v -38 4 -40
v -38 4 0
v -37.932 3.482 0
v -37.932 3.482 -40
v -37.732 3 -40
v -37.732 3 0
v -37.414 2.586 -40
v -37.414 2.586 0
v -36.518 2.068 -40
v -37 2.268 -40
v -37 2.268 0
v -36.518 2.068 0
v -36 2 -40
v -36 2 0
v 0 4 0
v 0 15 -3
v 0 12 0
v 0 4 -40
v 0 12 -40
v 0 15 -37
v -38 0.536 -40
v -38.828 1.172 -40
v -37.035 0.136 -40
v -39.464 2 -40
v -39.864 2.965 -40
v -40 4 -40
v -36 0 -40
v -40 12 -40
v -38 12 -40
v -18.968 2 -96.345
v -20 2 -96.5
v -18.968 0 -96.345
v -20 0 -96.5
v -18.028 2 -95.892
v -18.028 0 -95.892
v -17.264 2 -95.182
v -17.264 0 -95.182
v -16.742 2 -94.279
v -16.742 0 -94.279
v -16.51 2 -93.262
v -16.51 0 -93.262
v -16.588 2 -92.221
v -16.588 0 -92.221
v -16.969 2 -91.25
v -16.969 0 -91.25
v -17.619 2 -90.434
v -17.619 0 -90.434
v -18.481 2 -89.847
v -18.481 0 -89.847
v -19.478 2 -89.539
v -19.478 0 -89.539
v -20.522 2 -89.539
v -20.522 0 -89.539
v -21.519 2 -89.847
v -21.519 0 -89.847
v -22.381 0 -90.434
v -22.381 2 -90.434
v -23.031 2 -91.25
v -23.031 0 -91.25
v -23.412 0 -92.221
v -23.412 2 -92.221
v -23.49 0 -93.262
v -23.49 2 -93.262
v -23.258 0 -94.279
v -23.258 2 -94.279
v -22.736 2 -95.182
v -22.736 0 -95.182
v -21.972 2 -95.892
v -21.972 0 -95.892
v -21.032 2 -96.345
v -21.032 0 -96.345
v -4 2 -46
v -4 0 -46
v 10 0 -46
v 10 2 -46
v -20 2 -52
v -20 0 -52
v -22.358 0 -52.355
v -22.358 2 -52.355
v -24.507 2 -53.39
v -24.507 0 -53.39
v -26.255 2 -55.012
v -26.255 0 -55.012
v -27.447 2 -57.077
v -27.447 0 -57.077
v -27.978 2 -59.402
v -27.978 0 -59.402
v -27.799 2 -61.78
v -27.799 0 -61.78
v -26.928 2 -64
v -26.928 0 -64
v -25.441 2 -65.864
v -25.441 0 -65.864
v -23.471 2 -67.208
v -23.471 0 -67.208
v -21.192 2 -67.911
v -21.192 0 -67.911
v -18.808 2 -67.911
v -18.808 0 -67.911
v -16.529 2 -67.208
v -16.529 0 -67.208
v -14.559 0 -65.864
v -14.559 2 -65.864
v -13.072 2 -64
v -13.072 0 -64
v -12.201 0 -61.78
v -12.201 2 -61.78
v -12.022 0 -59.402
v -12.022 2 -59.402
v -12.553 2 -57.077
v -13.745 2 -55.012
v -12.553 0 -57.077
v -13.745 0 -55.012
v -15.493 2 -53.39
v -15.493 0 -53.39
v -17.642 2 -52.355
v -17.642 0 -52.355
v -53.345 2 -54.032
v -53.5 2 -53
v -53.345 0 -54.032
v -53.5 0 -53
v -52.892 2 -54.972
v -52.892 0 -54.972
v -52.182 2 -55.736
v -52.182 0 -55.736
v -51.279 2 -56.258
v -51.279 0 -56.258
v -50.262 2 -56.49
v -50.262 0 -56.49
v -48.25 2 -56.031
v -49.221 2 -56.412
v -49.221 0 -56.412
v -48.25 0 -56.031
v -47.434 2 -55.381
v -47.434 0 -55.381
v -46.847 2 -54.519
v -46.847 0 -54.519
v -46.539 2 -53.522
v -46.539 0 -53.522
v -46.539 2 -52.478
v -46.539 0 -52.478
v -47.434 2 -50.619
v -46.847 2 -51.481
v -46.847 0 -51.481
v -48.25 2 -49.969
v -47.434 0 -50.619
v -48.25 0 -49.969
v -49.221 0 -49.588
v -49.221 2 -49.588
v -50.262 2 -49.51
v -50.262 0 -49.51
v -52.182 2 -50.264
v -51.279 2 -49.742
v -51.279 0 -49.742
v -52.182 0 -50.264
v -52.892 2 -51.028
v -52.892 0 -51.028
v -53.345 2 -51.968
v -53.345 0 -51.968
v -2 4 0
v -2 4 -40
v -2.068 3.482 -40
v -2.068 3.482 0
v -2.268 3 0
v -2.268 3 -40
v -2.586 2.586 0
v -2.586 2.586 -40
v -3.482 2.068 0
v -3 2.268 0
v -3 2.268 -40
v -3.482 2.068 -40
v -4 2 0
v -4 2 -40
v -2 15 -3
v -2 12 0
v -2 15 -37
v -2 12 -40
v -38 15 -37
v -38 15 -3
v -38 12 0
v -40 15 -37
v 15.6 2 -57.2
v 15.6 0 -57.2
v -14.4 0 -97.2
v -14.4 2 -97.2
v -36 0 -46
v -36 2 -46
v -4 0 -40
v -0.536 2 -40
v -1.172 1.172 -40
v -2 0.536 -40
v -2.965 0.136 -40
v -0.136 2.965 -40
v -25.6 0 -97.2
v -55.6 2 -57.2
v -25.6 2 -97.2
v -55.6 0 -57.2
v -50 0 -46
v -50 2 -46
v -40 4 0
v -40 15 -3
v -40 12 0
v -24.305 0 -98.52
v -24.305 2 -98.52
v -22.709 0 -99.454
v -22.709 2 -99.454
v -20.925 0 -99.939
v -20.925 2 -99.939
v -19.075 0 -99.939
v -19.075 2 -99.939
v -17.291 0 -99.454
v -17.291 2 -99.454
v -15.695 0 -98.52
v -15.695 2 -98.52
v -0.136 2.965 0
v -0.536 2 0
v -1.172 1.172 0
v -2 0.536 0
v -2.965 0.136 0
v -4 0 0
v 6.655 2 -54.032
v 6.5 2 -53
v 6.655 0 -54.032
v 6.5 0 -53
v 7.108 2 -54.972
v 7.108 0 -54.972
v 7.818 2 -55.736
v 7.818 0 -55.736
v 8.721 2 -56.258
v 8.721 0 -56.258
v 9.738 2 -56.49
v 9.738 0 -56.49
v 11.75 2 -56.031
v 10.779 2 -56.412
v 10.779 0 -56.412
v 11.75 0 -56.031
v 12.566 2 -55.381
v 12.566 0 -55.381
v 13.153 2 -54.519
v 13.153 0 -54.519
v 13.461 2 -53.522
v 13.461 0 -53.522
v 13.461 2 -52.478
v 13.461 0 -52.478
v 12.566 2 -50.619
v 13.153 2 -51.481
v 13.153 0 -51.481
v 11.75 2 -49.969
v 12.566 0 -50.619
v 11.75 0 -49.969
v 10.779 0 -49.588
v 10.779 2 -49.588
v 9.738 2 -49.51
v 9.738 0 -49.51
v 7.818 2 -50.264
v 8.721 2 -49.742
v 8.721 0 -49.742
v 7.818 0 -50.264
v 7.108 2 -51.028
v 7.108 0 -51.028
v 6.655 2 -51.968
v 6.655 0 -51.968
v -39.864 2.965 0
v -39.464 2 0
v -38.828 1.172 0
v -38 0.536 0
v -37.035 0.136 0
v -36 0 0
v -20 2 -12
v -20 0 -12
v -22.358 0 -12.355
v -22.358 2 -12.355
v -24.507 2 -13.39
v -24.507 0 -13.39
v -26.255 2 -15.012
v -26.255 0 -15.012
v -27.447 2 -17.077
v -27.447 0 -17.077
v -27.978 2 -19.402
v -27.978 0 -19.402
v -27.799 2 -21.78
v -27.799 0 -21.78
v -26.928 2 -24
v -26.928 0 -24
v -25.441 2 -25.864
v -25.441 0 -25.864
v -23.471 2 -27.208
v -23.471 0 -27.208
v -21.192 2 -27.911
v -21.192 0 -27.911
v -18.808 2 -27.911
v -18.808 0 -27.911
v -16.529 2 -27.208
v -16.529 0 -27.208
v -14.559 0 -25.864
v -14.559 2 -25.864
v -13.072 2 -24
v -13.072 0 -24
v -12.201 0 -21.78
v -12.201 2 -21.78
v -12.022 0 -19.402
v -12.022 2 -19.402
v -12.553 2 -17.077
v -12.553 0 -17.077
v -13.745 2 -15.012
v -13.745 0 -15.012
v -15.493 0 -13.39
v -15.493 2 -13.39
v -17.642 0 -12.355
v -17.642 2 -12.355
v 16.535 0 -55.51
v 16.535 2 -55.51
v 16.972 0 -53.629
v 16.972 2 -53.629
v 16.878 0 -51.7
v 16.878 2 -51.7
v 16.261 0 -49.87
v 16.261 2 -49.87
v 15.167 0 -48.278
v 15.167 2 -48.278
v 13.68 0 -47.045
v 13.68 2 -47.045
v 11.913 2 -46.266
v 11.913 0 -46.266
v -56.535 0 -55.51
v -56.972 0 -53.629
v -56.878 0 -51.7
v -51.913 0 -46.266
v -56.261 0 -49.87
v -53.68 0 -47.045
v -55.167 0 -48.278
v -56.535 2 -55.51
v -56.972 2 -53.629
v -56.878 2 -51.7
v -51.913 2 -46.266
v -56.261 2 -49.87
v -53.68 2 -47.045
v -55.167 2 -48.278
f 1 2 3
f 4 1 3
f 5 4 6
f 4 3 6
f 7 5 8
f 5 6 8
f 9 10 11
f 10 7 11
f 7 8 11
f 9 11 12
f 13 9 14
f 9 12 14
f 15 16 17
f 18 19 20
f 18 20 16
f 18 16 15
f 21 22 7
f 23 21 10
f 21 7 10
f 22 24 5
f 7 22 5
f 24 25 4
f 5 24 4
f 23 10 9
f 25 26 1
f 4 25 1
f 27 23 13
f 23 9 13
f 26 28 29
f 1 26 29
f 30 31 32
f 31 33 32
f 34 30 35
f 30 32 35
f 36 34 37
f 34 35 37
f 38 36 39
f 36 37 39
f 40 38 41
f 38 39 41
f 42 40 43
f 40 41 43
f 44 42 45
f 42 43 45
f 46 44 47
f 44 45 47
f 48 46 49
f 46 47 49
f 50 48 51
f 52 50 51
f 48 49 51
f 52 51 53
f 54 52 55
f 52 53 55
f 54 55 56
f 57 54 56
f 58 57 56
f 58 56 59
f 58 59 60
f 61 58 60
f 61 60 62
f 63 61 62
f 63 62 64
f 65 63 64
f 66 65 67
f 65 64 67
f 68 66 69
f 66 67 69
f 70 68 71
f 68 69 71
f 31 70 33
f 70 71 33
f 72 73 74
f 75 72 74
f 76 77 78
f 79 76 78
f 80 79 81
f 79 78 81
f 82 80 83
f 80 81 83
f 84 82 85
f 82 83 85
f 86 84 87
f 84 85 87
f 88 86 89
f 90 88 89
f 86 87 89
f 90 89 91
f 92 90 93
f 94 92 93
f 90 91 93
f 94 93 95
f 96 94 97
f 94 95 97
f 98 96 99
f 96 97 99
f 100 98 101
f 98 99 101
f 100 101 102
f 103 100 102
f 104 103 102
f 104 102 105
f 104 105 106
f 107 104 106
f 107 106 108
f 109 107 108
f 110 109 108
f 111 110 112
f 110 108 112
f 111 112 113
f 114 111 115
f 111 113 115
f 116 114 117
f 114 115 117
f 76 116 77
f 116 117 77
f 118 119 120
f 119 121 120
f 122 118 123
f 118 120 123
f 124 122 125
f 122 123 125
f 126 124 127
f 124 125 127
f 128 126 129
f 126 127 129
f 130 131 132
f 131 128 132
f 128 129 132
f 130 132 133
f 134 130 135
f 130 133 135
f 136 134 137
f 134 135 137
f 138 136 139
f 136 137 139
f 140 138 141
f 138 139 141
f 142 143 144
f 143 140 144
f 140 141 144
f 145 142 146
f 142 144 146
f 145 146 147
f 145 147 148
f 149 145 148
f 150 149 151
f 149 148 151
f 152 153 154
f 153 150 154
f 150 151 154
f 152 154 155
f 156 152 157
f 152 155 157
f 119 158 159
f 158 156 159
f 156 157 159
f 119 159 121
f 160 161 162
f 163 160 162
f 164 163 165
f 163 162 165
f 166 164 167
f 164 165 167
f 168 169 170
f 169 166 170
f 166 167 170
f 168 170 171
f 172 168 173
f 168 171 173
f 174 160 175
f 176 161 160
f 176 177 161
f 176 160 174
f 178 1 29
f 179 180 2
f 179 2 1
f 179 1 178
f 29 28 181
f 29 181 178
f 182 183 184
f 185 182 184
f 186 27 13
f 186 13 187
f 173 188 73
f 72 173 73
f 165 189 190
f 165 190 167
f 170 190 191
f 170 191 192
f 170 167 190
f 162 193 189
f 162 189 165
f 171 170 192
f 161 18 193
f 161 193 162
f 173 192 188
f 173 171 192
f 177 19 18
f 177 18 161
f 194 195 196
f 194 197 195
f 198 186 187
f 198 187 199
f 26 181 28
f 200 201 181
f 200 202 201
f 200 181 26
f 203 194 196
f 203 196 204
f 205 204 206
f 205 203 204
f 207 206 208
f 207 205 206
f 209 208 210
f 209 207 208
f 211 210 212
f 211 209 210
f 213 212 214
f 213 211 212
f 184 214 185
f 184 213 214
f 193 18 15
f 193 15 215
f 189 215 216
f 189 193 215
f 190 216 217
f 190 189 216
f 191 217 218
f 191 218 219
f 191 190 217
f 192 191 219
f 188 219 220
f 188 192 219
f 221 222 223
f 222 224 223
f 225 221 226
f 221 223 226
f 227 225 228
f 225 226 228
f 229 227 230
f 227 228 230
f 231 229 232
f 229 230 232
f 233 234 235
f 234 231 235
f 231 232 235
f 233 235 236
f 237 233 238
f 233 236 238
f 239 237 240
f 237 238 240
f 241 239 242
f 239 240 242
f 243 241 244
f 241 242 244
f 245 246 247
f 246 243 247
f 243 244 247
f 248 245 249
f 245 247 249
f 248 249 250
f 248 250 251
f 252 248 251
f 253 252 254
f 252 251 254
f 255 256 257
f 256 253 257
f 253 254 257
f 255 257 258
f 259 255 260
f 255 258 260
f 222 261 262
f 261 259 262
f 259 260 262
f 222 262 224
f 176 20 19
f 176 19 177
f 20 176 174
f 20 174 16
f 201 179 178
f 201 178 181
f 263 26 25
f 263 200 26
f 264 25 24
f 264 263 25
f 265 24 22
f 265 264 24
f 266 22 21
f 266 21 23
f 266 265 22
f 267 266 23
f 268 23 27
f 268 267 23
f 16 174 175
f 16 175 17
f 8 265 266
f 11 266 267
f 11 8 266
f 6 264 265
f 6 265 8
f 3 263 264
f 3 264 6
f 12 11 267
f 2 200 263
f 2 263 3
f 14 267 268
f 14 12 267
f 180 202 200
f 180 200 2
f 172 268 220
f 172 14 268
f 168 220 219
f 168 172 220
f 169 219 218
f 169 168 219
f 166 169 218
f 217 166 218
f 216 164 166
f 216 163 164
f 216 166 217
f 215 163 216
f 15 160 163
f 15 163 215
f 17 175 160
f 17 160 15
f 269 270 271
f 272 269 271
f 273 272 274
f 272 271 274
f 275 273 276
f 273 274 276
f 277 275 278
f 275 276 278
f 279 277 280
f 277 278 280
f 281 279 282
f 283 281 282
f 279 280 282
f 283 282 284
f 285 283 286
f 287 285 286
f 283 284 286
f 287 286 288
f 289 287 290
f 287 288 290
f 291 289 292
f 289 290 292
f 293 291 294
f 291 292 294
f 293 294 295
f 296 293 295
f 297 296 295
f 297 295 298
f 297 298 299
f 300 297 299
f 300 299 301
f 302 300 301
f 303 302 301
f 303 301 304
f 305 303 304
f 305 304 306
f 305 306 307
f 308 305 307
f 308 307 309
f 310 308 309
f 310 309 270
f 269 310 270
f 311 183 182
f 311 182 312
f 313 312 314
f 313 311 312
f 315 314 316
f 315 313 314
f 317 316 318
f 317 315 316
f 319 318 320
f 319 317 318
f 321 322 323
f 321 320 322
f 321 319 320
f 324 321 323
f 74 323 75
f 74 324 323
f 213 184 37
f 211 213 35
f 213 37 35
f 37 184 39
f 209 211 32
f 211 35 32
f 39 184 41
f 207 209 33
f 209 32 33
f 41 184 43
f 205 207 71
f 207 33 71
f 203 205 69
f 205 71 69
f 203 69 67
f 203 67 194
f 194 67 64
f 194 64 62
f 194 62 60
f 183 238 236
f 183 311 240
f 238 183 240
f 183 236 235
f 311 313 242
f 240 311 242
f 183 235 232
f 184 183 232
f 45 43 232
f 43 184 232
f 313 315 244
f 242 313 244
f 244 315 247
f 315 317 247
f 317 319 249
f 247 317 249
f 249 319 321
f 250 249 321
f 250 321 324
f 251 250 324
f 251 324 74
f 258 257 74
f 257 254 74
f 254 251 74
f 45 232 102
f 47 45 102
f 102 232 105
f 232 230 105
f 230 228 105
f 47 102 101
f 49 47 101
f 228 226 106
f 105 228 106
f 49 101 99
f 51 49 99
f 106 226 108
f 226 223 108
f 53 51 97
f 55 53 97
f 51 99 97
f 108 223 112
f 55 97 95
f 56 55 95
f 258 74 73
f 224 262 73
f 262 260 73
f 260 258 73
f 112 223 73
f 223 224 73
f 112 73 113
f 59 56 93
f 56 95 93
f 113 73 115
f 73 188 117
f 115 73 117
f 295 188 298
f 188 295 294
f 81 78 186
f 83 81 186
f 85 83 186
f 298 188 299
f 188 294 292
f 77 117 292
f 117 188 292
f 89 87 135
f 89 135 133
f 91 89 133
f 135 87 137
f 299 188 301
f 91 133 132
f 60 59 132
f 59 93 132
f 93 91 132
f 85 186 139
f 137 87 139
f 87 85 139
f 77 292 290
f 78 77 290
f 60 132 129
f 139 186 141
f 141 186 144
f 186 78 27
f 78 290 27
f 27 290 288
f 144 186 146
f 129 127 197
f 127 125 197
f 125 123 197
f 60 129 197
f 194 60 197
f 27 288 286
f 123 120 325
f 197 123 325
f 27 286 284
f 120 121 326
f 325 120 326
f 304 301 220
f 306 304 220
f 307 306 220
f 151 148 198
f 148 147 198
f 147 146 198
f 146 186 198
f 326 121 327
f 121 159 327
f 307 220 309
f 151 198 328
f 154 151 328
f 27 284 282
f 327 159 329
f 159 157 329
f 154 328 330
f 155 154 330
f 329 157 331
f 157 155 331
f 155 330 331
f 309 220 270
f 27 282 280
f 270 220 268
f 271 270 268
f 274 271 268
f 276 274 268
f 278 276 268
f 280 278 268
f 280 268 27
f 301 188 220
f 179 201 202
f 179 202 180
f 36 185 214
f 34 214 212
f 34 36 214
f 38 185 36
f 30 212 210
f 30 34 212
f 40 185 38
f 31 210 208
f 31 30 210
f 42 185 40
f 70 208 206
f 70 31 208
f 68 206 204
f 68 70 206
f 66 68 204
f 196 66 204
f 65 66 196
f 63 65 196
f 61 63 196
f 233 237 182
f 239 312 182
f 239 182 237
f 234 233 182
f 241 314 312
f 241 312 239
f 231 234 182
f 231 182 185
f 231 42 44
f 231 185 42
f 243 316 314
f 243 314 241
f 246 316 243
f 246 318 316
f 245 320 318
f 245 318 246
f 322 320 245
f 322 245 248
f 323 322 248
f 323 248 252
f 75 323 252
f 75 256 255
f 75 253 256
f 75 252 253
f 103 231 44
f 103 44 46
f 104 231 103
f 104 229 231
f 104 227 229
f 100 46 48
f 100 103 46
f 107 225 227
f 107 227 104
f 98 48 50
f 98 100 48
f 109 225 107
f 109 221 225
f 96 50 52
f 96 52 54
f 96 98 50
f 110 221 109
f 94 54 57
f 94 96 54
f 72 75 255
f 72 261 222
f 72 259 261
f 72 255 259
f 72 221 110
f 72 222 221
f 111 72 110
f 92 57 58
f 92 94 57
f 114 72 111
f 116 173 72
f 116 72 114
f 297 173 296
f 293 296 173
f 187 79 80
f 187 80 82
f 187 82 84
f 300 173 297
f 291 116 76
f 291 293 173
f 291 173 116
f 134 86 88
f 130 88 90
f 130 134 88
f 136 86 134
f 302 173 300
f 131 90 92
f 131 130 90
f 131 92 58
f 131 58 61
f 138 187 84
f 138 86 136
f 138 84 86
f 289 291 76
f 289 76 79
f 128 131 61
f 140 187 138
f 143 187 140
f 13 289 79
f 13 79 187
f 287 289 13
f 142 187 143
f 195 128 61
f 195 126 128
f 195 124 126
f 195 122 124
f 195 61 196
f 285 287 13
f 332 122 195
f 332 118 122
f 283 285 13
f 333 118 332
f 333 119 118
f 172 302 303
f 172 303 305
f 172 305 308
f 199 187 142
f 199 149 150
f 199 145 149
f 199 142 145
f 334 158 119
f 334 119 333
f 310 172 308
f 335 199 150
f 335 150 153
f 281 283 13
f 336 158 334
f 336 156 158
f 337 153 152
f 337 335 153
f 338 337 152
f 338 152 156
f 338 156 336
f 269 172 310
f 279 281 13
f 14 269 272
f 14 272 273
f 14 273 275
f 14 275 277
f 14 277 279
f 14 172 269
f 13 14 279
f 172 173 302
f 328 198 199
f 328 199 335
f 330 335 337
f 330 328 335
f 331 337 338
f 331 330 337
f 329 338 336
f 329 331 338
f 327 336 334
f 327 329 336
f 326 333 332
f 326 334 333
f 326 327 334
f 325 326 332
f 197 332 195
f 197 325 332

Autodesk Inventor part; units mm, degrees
ref_plane "YZ Plane" through (0, 0, 0) normal (1, 0, 0) x (0, 1, 0)
ref_plane "XZ Plane" through (0, 0, 0) normal (0, 1, 0) x (-1, 0, 0)
ref_plane "XY Plane" through (0, 0, 0) normal (0, 0, 1) x (1, 0, 0)
sketch "Náčrt1" plane through (0, 0, 0) normal (0, 1, 0) x (-1, 0, 0)
  line L0 (20, 0) -> (40, 0)
  line L1 (40, 0) -> (40, -40)
  line L2 (40, -40) -> (36, -40)
  line L3 (36, -40) -> (36, -46)
  circle A0 centre (50, -53) radius 3.5
  arc A1 (55.6, -57.2) -> (50, -46) centre (50, -53) ccw
  line L4 (36, -46) -> (50, -46)
  arc A2 (20, -96.5) -> (20, -89.5) centre (20, -93) ccw
  arc A3 (20, -100) -> (25.6, -97.2) centre (20, -93) ccw
  line L5 (55.6, -57.2) -> (25.6, -97.2)
  line L6 (20, 0) -> (0, 0)
  line L7 (0, 0) -> (0, -40)
  line L8 (0, -40) -> (4, -40)
  line L9 (4, -40) -> (4, -46)
  circle A4 centre (-10, -53) radius 3.5
  arc A5 (-10, -46) -> (-15.6, -57.2) centre (-10, -53) ccw
  line L10 (4, -46) -> (-10, -46)
  arc A6 (20, -89.5) -> (20, -96.5) centre (20, -93) ccw
  arc A7 (14.4, -97.2) -> (20, -100) centre (20, -93) ccw
  line L11 (-15.6, -57.2) -> (14.4, -97.2)
  dimension "d0" = 40
  dimension "d1" = 40
  dimension "d2" = 4
  dimension "d3" = 6
  dimension "d8" = 7
  dimension "d9" = 14
  dimension "d11" = 7
  dimension "d12" = 14
  dimension "d13" = 60
extrude "Deska1" add sketch "Náčrt1" along normal blind 2
sketch "Náčrt2" plane through (-38, 0, 0) normal (-1, 0, 0) x (0, -1, 0)
  line L0 (0, -40) -> (0, 0)
  line L1 (0, 0) -> (-15, 0)
  line L2 (-15, 0) -> (-15, -40)
  line L3 (-15, -40) -> (0, -40)
edge flange "Obruba1" height 15 angle 90 thickness 2 bend radius 2 thickness toward (-1, 0, 0) relief tear relief width 2 relief depth 1 corner gap 2 corner form 0 edges at (-40, 2, -20) (0, 2, -20) wall of the first edge with corners at (-38, 0, -40) (-38, 0, 0) (-38, 15, 0) (-38, 15, -40)
bend "Ohyb1"
corner "Roh1"
chamfer "Zkosení rohu1" distance 3 angle 45 4 edges at (-39, 15, -40) (-39, 15, 0) (-1, 15, -40) (-1, 15, 0)
sketch "Náčrt3" plane through (0, 2, 0) normal (0, 1, 0) x (1, 0, 0)
  line L0 (-4, 0) -> (-36, 0) construction
  line L1 (-40, 40) -> (-40, 0) construction
  point P0 (0, 0)
  point P1 (-20, 20)
  dimension "d28" = 20
  dimension "d29" = 20
hole "Díra1" at (-20, 2, -20) direction (0, -1, 0) diameter 16 depth 2 tip angle 118
sketch "Náčrt5" plane through (0, 2, 0) normal (0, 1, 0) x (1, 0, 0)
  line L0 (-4, 0) -> (-36, 0) construction
  line L1 (-40, 37) -> (-40, 3) construction
  point P0 (0, 0)
  point P1 (-20, 60)
  dimension "d46" = 60
  dimension "d47" = 20
hole "Díra3" at (-20, 2, -60) direction (0, -1, 0) diameter 16 depth 2 tip angle 118
equation "\"d35\" = Tloušťka"
equation "\"d53\" = Tloušťka"
equation "\"d14\" = Tloušťka"
equation "\"d15\" = ŠířkaVýštipu"
equation "\"d16\" = HloubkaVýštipu"
equation "\"d17\" = MinimálníZbytek"
equation "\"d18\" = PřechodovýPoloměr"
equation "\"d21\" = PoloměrOhybu"
equation "\"d22\" = VelikostRohovéhoVýštipu"
equation "\"d23\" = VelikostMezery"
equation "\"d24\" = VelikostJacobihoPoloměru"
equation "\"PoloměrOhybu\" = Tloušťka"
equation "\"ŠířkaVýštipu\" = Tloušťka"
equation "\"HloubkaVýštipu\" = 0.5 * Tloušťka"
equation "\"VelikostRohovéhoVýštipu\" = 4 * Tloušťka"
equation "\"MinimálníZbytek\" = 2 * Tloušťka"
equation "\"PřechodovýPoloměr\" = PoloměrOhybu"
equation "\"VelikostJacobihoPoloměru\" = PoloměrOhybu"
equation "\"VelikostMezery\" = Tloušťka"
equation "\"Tloušťka\" = 2"
properties part number "26886-Vodička_Vojtěch_příklad-4"
